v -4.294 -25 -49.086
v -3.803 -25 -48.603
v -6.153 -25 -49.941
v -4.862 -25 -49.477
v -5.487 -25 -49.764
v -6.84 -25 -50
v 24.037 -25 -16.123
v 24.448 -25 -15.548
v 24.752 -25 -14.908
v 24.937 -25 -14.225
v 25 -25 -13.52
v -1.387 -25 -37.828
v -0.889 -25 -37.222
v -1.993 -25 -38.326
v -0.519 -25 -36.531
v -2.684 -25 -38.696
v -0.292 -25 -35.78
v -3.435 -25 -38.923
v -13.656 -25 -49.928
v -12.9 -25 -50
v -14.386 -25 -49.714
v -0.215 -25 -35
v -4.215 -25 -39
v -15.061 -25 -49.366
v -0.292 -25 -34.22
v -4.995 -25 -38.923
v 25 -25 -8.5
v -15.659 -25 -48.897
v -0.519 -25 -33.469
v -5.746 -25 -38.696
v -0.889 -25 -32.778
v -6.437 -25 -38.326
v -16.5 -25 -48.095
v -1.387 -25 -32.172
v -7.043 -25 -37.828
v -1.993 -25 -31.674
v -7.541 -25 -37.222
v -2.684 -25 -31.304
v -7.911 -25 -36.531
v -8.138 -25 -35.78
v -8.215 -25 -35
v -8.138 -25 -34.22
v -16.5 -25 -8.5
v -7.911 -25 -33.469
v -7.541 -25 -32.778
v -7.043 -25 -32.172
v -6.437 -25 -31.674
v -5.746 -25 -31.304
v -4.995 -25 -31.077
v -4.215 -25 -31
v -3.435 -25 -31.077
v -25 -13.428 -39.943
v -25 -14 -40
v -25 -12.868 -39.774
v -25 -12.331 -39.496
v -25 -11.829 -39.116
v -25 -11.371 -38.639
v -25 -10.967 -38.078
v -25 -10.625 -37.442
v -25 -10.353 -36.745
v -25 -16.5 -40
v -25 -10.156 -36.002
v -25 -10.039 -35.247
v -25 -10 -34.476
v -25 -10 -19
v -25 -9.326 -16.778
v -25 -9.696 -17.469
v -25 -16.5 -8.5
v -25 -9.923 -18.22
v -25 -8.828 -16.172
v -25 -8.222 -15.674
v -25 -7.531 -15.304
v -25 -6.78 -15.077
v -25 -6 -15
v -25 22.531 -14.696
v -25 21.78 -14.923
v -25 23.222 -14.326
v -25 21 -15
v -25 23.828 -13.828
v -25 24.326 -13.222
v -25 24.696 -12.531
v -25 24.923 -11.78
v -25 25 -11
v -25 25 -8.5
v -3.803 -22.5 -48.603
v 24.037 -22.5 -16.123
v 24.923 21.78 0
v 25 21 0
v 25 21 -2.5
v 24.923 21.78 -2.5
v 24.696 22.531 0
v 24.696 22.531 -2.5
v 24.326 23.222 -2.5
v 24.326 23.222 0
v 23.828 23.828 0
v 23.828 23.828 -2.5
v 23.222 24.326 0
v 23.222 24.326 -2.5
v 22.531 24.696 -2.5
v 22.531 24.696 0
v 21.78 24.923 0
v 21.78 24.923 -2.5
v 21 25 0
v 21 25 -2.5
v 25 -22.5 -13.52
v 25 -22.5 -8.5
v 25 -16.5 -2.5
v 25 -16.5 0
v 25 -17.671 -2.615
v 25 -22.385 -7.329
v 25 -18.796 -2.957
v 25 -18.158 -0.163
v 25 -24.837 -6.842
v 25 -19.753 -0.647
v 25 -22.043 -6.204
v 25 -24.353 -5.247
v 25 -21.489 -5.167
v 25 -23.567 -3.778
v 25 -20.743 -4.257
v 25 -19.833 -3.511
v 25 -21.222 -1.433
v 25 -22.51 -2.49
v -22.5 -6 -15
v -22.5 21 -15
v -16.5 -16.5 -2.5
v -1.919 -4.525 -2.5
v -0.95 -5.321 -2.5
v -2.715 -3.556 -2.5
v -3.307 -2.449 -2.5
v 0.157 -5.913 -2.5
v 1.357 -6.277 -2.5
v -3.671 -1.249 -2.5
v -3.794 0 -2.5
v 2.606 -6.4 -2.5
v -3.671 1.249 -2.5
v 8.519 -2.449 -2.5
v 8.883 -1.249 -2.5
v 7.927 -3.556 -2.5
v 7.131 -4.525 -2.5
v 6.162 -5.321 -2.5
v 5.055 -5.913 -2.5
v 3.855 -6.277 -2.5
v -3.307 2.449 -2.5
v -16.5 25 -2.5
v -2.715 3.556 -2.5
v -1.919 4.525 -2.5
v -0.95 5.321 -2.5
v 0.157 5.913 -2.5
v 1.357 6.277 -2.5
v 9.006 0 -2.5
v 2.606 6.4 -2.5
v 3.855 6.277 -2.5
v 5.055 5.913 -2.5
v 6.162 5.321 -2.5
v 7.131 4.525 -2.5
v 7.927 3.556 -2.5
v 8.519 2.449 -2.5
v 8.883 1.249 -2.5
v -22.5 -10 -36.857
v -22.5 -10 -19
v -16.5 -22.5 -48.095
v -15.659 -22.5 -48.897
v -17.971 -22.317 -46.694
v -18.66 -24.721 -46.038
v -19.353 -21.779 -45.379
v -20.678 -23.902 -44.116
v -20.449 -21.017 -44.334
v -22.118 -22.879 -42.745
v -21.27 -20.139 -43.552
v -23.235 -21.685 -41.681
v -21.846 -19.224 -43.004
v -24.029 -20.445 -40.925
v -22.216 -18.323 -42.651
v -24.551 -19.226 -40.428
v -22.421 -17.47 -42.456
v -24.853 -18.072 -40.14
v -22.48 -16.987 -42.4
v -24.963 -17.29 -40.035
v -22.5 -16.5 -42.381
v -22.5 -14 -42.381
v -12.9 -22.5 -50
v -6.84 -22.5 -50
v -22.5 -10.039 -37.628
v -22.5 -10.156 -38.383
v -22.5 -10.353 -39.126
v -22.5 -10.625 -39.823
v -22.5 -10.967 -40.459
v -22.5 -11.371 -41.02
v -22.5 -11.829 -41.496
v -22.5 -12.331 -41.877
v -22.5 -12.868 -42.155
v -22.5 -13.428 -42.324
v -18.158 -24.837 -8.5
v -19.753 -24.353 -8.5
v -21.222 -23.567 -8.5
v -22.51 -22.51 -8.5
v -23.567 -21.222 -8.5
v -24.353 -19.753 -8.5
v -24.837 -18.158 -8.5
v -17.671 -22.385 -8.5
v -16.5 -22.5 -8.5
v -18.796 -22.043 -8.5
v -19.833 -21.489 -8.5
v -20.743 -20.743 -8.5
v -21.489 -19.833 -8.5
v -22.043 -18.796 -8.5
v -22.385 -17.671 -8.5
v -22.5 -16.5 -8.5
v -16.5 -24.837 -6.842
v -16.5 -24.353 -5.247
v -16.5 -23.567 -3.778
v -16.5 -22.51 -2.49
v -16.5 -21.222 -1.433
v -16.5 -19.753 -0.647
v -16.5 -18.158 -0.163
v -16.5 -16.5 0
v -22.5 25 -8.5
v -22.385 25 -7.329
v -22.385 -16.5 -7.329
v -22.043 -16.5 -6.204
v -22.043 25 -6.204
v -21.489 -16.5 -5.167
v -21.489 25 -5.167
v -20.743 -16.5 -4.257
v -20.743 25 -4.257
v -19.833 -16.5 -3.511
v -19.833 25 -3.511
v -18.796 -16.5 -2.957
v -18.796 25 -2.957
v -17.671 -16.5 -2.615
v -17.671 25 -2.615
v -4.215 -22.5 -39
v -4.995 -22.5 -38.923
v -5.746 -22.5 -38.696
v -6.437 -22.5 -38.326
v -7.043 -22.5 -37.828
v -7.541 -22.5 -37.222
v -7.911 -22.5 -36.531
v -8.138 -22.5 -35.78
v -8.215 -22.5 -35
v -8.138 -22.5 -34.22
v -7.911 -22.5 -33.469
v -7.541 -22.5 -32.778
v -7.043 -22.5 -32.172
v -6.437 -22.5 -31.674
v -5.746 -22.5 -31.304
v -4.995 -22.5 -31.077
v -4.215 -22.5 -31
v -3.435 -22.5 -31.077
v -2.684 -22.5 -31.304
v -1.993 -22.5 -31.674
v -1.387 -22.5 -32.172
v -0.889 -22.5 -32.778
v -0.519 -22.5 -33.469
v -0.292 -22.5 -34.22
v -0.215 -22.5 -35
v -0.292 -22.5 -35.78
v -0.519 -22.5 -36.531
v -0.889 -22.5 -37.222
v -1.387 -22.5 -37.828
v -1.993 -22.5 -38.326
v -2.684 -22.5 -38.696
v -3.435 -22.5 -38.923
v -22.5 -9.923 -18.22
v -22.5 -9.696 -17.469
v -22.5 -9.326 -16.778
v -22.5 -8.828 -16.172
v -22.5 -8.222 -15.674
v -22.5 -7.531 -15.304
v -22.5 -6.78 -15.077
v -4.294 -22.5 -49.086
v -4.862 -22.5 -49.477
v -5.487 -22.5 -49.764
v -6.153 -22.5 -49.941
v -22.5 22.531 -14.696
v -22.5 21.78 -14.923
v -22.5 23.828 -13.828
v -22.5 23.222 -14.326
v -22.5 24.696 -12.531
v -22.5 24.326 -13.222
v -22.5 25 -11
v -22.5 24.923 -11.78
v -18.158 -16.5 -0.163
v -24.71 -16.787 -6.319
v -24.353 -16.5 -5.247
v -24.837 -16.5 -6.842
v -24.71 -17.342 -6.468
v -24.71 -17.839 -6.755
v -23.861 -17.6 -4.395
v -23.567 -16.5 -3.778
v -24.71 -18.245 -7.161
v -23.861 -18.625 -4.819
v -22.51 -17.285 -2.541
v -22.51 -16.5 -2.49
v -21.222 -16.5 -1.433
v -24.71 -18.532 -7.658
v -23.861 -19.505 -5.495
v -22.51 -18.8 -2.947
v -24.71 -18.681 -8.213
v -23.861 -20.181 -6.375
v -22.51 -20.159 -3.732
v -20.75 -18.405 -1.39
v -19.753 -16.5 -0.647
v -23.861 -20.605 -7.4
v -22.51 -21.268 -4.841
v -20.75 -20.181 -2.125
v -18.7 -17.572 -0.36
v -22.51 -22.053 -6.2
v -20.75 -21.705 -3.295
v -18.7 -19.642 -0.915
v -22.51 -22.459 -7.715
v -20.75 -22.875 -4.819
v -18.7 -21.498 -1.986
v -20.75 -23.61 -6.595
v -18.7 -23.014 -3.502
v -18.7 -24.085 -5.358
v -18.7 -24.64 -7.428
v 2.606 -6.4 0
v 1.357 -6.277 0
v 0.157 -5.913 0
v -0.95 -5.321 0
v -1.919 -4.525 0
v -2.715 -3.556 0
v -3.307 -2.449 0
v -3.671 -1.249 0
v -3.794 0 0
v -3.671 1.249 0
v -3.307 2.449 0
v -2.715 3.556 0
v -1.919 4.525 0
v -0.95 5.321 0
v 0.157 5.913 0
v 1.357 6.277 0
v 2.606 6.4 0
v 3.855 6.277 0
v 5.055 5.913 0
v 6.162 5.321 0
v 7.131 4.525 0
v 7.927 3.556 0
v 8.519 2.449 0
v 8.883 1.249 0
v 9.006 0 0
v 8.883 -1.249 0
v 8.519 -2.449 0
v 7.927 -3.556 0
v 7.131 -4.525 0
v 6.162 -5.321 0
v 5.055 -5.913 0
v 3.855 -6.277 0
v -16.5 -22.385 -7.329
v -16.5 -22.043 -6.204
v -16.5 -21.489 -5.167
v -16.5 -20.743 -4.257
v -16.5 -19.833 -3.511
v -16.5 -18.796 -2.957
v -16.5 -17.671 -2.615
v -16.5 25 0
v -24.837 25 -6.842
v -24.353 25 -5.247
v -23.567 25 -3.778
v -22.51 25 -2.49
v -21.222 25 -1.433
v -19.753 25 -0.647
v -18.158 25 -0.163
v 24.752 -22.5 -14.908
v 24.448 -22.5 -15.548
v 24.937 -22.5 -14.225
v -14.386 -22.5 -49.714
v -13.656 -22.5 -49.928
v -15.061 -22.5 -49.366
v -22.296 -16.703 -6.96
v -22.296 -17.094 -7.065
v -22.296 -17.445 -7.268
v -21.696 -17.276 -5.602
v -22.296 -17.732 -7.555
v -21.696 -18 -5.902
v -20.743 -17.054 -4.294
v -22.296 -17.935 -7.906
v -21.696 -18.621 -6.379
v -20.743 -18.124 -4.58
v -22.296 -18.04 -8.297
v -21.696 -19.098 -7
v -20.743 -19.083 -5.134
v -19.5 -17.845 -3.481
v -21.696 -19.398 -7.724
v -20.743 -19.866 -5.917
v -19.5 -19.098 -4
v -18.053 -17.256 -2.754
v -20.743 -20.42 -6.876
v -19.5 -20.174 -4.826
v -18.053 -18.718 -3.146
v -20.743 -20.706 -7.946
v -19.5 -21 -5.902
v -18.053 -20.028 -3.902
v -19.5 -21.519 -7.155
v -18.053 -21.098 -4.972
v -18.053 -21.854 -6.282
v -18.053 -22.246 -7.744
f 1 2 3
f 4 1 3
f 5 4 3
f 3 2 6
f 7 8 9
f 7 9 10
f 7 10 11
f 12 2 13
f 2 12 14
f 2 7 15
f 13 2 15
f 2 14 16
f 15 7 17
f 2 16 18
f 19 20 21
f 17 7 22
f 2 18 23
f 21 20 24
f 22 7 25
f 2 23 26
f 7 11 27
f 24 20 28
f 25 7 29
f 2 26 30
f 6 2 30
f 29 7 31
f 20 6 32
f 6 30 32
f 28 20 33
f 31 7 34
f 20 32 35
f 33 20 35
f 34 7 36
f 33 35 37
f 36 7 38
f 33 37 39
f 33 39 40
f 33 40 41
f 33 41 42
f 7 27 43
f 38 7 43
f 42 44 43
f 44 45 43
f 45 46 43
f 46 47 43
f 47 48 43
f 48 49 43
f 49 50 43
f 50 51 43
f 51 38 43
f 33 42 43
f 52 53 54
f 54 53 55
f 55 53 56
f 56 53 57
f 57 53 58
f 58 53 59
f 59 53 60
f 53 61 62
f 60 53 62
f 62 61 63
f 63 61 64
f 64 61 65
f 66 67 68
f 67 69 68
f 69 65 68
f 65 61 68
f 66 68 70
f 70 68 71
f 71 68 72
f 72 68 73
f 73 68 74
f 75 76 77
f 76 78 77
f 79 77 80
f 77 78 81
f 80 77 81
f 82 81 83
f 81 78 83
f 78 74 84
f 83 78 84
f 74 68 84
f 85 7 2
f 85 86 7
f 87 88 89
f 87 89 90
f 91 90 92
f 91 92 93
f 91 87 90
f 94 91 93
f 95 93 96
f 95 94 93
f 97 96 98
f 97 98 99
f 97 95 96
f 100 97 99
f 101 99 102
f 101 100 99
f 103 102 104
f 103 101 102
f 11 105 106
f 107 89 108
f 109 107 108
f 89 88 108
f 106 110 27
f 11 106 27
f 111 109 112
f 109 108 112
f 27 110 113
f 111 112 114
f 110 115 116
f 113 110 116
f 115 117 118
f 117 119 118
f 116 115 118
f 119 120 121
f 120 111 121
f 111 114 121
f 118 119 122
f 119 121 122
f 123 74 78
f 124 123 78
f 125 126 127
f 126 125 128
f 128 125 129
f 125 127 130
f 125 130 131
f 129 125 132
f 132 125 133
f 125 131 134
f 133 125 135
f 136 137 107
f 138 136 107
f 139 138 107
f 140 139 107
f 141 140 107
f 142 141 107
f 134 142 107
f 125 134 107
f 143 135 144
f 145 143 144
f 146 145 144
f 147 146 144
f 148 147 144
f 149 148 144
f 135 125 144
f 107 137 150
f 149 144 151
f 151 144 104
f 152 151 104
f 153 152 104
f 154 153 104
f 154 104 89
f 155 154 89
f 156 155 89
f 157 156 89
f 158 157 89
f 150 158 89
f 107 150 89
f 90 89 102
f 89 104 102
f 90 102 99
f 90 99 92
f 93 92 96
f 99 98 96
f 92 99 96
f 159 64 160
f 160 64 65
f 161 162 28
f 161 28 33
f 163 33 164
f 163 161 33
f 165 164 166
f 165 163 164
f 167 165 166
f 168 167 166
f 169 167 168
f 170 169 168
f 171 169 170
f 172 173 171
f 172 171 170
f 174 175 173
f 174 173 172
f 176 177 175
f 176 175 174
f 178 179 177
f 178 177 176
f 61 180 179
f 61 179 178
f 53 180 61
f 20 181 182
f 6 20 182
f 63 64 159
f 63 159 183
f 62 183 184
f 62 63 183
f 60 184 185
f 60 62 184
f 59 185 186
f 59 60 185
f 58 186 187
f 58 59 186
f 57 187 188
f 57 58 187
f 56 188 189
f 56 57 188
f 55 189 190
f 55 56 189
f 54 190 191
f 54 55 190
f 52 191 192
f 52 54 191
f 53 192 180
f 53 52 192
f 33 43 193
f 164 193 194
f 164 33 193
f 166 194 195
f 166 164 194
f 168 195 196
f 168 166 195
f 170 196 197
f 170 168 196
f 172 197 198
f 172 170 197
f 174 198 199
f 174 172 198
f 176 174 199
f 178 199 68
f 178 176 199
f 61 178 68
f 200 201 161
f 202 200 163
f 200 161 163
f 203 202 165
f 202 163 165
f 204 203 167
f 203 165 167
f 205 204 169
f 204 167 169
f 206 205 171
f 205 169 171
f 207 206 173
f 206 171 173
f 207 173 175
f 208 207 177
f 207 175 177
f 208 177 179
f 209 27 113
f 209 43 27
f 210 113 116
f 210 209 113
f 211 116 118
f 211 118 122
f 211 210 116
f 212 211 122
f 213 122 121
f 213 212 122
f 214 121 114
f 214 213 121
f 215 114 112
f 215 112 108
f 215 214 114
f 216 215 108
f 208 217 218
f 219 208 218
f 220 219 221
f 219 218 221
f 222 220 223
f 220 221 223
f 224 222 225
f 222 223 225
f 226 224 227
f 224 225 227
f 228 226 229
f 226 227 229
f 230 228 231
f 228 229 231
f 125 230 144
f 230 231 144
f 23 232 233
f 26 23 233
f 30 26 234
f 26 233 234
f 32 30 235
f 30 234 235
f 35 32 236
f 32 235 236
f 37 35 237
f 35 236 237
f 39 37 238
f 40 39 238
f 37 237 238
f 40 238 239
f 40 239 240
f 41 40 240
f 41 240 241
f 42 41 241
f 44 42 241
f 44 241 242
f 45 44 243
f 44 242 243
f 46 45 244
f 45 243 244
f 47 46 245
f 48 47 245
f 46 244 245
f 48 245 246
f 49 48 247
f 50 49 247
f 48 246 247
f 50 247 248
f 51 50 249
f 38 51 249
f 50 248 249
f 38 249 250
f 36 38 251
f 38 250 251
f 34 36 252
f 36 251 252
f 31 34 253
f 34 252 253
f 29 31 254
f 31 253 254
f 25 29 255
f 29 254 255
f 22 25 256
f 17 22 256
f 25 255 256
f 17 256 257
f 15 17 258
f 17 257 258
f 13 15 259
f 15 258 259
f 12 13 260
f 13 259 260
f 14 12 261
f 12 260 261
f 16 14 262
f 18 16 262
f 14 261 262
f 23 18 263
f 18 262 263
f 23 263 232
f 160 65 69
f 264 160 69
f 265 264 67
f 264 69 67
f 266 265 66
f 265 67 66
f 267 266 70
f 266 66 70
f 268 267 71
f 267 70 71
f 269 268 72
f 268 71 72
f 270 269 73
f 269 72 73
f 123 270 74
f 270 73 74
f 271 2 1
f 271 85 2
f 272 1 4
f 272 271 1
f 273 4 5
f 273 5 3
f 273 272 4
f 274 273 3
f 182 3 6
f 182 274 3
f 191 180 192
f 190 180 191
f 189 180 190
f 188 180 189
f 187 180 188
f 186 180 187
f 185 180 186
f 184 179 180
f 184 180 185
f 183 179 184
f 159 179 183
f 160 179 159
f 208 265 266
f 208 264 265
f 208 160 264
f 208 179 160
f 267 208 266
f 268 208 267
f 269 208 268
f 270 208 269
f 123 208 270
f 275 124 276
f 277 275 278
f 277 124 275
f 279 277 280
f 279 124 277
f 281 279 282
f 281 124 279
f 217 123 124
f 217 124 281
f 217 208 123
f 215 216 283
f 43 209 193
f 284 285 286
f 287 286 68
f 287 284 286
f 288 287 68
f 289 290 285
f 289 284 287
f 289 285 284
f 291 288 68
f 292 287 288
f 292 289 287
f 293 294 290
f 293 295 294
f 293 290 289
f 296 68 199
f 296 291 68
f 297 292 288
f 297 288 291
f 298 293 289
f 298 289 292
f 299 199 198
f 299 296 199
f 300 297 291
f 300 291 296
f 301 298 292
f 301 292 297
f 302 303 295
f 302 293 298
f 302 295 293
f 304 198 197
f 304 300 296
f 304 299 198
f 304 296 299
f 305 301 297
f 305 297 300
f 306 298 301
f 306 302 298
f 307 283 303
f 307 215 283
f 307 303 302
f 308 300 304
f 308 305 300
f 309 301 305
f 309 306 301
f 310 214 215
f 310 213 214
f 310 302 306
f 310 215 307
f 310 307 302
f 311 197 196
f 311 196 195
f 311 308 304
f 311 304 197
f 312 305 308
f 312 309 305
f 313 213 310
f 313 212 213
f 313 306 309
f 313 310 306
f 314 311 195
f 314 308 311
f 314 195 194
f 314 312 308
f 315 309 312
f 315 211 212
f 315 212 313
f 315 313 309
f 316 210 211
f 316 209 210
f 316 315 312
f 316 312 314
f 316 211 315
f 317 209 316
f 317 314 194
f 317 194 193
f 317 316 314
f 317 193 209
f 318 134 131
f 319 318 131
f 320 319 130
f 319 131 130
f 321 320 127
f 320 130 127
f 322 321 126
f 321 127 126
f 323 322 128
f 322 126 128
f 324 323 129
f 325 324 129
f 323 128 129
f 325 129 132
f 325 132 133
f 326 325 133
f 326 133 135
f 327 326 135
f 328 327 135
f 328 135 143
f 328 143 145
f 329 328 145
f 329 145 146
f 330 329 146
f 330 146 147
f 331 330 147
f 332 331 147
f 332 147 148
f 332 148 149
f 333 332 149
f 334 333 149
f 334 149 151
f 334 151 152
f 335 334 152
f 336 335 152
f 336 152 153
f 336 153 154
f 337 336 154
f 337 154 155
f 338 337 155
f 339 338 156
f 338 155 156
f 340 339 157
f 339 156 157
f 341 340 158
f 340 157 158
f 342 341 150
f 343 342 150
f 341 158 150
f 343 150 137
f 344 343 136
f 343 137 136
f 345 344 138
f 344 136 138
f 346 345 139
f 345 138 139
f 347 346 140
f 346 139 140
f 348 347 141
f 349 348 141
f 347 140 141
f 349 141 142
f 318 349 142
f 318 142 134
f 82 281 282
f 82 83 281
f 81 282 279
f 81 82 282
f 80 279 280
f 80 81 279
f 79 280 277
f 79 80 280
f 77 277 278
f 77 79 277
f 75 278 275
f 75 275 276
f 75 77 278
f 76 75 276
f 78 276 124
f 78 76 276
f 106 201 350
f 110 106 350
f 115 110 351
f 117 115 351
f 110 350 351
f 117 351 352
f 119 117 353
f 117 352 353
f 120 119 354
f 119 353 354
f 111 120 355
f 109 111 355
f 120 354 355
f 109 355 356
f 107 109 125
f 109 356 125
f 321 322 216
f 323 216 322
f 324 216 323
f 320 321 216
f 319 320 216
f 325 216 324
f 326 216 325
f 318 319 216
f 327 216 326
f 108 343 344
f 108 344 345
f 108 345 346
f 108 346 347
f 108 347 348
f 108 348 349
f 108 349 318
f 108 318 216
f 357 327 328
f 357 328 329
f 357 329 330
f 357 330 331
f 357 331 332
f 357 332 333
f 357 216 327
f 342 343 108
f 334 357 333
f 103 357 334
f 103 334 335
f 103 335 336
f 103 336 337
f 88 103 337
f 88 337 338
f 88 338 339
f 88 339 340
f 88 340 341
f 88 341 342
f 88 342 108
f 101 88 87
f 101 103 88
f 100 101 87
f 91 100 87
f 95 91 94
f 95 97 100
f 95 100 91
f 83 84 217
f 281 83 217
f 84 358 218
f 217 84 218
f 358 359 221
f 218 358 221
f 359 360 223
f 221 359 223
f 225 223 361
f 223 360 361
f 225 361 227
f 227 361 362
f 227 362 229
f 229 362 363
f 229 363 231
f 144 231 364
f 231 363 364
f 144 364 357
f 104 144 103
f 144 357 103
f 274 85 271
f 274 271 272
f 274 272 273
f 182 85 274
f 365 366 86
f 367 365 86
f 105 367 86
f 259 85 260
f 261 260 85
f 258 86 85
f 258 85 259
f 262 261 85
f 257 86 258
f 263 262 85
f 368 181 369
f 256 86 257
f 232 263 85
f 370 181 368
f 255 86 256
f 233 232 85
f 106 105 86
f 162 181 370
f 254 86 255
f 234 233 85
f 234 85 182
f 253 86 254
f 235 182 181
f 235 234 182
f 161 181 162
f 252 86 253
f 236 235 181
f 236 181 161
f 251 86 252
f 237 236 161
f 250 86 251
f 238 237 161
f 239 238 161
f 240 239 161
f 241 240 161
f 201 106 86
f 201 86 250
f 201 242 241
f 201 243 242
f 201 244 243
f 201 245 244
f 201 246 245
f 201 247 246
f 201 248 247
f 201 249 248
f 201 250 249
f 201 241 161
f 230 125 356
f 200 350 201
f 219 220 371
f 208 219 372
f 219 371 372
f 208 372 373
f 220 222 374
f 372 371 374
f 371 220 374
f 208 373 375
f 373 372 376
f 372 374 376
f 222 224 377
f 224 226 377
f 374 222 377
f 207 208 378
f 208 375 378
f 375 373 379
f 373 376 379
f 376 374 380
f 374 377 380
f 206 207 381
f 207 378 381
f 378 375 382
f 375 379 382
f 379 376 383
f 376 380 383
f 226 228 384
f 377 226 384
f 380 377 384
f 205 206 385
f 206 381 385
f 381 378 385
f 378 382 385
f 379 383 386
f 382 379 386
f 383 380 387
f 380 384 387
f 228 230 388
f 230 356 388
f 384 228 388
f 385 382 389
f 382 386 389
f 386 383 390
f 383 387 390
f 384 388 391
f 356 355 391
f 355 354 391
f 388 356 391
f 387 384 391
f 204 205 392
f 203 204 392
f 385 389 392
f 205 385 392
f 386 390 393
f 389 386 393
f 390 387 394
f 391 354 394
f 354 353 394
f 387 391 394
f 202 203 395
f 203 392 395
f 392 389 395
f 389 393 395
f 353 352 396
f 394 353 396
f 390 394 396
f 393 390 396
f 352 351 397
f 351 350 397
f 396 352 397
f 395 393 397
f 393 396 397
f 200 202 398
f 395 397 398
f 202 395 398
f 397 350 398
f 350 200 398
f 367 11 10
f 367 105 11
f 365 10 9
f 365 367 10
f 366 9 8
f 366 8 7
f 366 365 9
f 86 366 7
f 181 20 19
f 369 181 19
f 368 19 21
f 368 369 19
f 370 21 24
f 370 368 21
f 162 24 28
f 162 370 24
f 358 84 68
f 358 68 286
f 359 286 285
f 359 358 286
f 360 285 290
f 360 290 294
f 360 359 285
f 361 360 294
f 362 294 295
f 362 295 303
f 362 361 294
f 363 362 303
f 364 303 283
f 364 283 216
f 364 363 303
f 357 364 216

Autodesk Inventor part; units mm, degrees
ref_plane "YZ Plane" through (0, 0, 0) normal (1, 0, 0) x (0, 1, 0)
ref_plane "XZ Plane" through (0, 0, 0) normal (0, 1, 0) x (-1, 0, 0)
ref_plane "XY Plane" through (0, 0, 0) normal (0, 0, 1) x (1, 0, 0)
sketch "Sketch1" plane through (0, 0, 0) normal (0, 0, 1) x (1, 0, 0)
  line L0 (-25, 25) -> (25, 25)
  line L1 (25, 25) -> (25, -25)
  line L2 (25, -25) -> (-25, -25)
  line L3 (-25, -25) -> (-25, 25)
  point P0 (0, 0)
  dimension "d0" = 50
  dimension "d1" = 50
  dimension "d2" = 25
  dimension "d3" = 25
extrude "Extrusion1" add sketch "Sketch1" against normal blind 50
fillet "Fillet1" radius 8.5 3 edges at (0, -25, 0) (-25, 0, 0) (-25, -25, -25)
shell "Shell1" thickness 2.5 removed faces 3 at (-8.3333, 11.1667, -50) at (-8.3333, 25, -36.1667) at (25, 11.1667, -16.6667)
sketch "Sketch2" plane through (-25, -16.5, -8.5) normal (-1, 0, 0) x (0, 0, 1)
  line L0 (0, 41.5) -> (-41.5, 41.5) projected
  line L1 (-41.5, 41.5) -> (-41.5, 0) projected
  line L2 (-41.5, 6.5) -> (-6.5, 6.5)
  line L3 (-6.5, 6.5) -> (-6.5, 41.5)
  line L4 (-6.5, 41.5) -> (-41.5, 41.5)
  line L5 (-41.5, 41.5) -> (-41.5, 6.5)
  point P0 (8.5, 16.5)
  dimension "d8" = 35
  dimension "d9" = 35
extrude "Extrusion2" cut sketch "Sketch2" against normal through all
sketch "Sketch3" plane through (-16.5, 25, 0) normal (0, 1, 0) x (1, 0, 0)
  line L0 (41.5, 0) -> (41.5, 2.5) projected
  line L1 (41.5, 15) -> (11.5, 50)
  line L2 (0, 50) -> (41.5, 50) projected
  line L3 (41.5, 50) -> (11.5, 50)
  line L4 (41.5, 50) -> (41.5, 15)
  point P0 (41.5, 33)
  point P1 (41.5, 8.5)
  point P2 (16.5, 0)
  point P3 (33, 50)
  point P4 (39, 50)
  dimension "d36" = 30
  dimension "d37" = 35
extrude "Extrusion3" cut sketch "Sketch3" against normal through all
sketch "Sketch4" plane through (0, 0, 0) normal (0, 0, 1) x (1, 0, 0)
  line L0 (-5, -25) -> (25, -25) projected
  line L1 (-16.5, -25) -> (25, -25) projected
  line L2 (-16.5, -25) -> (-5, -25) projected
  line L3 (-25, 25) -> (-25, -10) projected
  line L4 (-25, 25) -> (-25, -16.5) projected
  line L5 (-25, -10) -> (-25, -16.5) projected
  point P0 (0, 0)
  point P1 (2.606, 0)
  dimension "d17" = 27.606
  dimension "d18" = 25
hole "Hole1" at (2.606, 0, 0) direction (0, 0, -1) diameter 12.8 end through all
sketch "Sketch5" plane through (-16.5, -25, -8.5) normal (0, -1, 0) x (1, 0, 0)
  line L0 (12.706, 8.5) -> (25.506, 8.5) projected
  line L1 (0, 8.5) -> (41.5, 8.5) projected
  line L2 (41.5, 8.5) -> (0, 8.5) projected
  line L3 (-8.5, -6.5) -> (-8.5, -41.5) projected
  point P0 (16.5, 8.5)
  point P1 (12.285, -26.5)
  dimension "d43" = 20.785
  dimension "d44" = 35
hole "Hole2" at (-4.215, -25, -35) direction (0, 1, 0) diameter 8 end through all
sketch "Sketch6" plane through (-16.5, 25, 0) normal (0, 1, 0) x (1, 0, 0)
  arc A0 (-8.5, 8.5) -> (0, 0) centre (0, 8.5) ccw projected
  line L0 (0, 50) -> (11.5, 50) projected
  line L1 (-8.5, 15) -> (-8.5, 50) projected
  line L2 (2, 50) -> (-8.5, 40)
  line L3 (-8.5, 40) -> (-8.5, 50)
  line L4 (-8.5, 50) -> (2, 50)
  point P0 (16.5, 0)
  point P1 (9.6603, 50)
  point P2 (-8.5, 19)
  point P3 (-8.5, 46)
  dimension "d38" = 2
  dimension "d39" = 40
extrude "Extrusion4" cut sketch "Sketch6" against normal through all
fillet "Fillet3" radius 4 7 edges at (-23.75, 25, -15) (-23.75, -10, -41.1905) (-14.5, -23.75, -50) (-5, -23.75, -50) (25, -23.75, -15) (25, 25, -1.25) (-23.75, -10, -15)
equation "\"d0\" = d1"
equation "\"d2\" = 0.5 * d1"
equation "\"d3\" = 0.5 * d0"
properties part number "314-06" material "Steel"
